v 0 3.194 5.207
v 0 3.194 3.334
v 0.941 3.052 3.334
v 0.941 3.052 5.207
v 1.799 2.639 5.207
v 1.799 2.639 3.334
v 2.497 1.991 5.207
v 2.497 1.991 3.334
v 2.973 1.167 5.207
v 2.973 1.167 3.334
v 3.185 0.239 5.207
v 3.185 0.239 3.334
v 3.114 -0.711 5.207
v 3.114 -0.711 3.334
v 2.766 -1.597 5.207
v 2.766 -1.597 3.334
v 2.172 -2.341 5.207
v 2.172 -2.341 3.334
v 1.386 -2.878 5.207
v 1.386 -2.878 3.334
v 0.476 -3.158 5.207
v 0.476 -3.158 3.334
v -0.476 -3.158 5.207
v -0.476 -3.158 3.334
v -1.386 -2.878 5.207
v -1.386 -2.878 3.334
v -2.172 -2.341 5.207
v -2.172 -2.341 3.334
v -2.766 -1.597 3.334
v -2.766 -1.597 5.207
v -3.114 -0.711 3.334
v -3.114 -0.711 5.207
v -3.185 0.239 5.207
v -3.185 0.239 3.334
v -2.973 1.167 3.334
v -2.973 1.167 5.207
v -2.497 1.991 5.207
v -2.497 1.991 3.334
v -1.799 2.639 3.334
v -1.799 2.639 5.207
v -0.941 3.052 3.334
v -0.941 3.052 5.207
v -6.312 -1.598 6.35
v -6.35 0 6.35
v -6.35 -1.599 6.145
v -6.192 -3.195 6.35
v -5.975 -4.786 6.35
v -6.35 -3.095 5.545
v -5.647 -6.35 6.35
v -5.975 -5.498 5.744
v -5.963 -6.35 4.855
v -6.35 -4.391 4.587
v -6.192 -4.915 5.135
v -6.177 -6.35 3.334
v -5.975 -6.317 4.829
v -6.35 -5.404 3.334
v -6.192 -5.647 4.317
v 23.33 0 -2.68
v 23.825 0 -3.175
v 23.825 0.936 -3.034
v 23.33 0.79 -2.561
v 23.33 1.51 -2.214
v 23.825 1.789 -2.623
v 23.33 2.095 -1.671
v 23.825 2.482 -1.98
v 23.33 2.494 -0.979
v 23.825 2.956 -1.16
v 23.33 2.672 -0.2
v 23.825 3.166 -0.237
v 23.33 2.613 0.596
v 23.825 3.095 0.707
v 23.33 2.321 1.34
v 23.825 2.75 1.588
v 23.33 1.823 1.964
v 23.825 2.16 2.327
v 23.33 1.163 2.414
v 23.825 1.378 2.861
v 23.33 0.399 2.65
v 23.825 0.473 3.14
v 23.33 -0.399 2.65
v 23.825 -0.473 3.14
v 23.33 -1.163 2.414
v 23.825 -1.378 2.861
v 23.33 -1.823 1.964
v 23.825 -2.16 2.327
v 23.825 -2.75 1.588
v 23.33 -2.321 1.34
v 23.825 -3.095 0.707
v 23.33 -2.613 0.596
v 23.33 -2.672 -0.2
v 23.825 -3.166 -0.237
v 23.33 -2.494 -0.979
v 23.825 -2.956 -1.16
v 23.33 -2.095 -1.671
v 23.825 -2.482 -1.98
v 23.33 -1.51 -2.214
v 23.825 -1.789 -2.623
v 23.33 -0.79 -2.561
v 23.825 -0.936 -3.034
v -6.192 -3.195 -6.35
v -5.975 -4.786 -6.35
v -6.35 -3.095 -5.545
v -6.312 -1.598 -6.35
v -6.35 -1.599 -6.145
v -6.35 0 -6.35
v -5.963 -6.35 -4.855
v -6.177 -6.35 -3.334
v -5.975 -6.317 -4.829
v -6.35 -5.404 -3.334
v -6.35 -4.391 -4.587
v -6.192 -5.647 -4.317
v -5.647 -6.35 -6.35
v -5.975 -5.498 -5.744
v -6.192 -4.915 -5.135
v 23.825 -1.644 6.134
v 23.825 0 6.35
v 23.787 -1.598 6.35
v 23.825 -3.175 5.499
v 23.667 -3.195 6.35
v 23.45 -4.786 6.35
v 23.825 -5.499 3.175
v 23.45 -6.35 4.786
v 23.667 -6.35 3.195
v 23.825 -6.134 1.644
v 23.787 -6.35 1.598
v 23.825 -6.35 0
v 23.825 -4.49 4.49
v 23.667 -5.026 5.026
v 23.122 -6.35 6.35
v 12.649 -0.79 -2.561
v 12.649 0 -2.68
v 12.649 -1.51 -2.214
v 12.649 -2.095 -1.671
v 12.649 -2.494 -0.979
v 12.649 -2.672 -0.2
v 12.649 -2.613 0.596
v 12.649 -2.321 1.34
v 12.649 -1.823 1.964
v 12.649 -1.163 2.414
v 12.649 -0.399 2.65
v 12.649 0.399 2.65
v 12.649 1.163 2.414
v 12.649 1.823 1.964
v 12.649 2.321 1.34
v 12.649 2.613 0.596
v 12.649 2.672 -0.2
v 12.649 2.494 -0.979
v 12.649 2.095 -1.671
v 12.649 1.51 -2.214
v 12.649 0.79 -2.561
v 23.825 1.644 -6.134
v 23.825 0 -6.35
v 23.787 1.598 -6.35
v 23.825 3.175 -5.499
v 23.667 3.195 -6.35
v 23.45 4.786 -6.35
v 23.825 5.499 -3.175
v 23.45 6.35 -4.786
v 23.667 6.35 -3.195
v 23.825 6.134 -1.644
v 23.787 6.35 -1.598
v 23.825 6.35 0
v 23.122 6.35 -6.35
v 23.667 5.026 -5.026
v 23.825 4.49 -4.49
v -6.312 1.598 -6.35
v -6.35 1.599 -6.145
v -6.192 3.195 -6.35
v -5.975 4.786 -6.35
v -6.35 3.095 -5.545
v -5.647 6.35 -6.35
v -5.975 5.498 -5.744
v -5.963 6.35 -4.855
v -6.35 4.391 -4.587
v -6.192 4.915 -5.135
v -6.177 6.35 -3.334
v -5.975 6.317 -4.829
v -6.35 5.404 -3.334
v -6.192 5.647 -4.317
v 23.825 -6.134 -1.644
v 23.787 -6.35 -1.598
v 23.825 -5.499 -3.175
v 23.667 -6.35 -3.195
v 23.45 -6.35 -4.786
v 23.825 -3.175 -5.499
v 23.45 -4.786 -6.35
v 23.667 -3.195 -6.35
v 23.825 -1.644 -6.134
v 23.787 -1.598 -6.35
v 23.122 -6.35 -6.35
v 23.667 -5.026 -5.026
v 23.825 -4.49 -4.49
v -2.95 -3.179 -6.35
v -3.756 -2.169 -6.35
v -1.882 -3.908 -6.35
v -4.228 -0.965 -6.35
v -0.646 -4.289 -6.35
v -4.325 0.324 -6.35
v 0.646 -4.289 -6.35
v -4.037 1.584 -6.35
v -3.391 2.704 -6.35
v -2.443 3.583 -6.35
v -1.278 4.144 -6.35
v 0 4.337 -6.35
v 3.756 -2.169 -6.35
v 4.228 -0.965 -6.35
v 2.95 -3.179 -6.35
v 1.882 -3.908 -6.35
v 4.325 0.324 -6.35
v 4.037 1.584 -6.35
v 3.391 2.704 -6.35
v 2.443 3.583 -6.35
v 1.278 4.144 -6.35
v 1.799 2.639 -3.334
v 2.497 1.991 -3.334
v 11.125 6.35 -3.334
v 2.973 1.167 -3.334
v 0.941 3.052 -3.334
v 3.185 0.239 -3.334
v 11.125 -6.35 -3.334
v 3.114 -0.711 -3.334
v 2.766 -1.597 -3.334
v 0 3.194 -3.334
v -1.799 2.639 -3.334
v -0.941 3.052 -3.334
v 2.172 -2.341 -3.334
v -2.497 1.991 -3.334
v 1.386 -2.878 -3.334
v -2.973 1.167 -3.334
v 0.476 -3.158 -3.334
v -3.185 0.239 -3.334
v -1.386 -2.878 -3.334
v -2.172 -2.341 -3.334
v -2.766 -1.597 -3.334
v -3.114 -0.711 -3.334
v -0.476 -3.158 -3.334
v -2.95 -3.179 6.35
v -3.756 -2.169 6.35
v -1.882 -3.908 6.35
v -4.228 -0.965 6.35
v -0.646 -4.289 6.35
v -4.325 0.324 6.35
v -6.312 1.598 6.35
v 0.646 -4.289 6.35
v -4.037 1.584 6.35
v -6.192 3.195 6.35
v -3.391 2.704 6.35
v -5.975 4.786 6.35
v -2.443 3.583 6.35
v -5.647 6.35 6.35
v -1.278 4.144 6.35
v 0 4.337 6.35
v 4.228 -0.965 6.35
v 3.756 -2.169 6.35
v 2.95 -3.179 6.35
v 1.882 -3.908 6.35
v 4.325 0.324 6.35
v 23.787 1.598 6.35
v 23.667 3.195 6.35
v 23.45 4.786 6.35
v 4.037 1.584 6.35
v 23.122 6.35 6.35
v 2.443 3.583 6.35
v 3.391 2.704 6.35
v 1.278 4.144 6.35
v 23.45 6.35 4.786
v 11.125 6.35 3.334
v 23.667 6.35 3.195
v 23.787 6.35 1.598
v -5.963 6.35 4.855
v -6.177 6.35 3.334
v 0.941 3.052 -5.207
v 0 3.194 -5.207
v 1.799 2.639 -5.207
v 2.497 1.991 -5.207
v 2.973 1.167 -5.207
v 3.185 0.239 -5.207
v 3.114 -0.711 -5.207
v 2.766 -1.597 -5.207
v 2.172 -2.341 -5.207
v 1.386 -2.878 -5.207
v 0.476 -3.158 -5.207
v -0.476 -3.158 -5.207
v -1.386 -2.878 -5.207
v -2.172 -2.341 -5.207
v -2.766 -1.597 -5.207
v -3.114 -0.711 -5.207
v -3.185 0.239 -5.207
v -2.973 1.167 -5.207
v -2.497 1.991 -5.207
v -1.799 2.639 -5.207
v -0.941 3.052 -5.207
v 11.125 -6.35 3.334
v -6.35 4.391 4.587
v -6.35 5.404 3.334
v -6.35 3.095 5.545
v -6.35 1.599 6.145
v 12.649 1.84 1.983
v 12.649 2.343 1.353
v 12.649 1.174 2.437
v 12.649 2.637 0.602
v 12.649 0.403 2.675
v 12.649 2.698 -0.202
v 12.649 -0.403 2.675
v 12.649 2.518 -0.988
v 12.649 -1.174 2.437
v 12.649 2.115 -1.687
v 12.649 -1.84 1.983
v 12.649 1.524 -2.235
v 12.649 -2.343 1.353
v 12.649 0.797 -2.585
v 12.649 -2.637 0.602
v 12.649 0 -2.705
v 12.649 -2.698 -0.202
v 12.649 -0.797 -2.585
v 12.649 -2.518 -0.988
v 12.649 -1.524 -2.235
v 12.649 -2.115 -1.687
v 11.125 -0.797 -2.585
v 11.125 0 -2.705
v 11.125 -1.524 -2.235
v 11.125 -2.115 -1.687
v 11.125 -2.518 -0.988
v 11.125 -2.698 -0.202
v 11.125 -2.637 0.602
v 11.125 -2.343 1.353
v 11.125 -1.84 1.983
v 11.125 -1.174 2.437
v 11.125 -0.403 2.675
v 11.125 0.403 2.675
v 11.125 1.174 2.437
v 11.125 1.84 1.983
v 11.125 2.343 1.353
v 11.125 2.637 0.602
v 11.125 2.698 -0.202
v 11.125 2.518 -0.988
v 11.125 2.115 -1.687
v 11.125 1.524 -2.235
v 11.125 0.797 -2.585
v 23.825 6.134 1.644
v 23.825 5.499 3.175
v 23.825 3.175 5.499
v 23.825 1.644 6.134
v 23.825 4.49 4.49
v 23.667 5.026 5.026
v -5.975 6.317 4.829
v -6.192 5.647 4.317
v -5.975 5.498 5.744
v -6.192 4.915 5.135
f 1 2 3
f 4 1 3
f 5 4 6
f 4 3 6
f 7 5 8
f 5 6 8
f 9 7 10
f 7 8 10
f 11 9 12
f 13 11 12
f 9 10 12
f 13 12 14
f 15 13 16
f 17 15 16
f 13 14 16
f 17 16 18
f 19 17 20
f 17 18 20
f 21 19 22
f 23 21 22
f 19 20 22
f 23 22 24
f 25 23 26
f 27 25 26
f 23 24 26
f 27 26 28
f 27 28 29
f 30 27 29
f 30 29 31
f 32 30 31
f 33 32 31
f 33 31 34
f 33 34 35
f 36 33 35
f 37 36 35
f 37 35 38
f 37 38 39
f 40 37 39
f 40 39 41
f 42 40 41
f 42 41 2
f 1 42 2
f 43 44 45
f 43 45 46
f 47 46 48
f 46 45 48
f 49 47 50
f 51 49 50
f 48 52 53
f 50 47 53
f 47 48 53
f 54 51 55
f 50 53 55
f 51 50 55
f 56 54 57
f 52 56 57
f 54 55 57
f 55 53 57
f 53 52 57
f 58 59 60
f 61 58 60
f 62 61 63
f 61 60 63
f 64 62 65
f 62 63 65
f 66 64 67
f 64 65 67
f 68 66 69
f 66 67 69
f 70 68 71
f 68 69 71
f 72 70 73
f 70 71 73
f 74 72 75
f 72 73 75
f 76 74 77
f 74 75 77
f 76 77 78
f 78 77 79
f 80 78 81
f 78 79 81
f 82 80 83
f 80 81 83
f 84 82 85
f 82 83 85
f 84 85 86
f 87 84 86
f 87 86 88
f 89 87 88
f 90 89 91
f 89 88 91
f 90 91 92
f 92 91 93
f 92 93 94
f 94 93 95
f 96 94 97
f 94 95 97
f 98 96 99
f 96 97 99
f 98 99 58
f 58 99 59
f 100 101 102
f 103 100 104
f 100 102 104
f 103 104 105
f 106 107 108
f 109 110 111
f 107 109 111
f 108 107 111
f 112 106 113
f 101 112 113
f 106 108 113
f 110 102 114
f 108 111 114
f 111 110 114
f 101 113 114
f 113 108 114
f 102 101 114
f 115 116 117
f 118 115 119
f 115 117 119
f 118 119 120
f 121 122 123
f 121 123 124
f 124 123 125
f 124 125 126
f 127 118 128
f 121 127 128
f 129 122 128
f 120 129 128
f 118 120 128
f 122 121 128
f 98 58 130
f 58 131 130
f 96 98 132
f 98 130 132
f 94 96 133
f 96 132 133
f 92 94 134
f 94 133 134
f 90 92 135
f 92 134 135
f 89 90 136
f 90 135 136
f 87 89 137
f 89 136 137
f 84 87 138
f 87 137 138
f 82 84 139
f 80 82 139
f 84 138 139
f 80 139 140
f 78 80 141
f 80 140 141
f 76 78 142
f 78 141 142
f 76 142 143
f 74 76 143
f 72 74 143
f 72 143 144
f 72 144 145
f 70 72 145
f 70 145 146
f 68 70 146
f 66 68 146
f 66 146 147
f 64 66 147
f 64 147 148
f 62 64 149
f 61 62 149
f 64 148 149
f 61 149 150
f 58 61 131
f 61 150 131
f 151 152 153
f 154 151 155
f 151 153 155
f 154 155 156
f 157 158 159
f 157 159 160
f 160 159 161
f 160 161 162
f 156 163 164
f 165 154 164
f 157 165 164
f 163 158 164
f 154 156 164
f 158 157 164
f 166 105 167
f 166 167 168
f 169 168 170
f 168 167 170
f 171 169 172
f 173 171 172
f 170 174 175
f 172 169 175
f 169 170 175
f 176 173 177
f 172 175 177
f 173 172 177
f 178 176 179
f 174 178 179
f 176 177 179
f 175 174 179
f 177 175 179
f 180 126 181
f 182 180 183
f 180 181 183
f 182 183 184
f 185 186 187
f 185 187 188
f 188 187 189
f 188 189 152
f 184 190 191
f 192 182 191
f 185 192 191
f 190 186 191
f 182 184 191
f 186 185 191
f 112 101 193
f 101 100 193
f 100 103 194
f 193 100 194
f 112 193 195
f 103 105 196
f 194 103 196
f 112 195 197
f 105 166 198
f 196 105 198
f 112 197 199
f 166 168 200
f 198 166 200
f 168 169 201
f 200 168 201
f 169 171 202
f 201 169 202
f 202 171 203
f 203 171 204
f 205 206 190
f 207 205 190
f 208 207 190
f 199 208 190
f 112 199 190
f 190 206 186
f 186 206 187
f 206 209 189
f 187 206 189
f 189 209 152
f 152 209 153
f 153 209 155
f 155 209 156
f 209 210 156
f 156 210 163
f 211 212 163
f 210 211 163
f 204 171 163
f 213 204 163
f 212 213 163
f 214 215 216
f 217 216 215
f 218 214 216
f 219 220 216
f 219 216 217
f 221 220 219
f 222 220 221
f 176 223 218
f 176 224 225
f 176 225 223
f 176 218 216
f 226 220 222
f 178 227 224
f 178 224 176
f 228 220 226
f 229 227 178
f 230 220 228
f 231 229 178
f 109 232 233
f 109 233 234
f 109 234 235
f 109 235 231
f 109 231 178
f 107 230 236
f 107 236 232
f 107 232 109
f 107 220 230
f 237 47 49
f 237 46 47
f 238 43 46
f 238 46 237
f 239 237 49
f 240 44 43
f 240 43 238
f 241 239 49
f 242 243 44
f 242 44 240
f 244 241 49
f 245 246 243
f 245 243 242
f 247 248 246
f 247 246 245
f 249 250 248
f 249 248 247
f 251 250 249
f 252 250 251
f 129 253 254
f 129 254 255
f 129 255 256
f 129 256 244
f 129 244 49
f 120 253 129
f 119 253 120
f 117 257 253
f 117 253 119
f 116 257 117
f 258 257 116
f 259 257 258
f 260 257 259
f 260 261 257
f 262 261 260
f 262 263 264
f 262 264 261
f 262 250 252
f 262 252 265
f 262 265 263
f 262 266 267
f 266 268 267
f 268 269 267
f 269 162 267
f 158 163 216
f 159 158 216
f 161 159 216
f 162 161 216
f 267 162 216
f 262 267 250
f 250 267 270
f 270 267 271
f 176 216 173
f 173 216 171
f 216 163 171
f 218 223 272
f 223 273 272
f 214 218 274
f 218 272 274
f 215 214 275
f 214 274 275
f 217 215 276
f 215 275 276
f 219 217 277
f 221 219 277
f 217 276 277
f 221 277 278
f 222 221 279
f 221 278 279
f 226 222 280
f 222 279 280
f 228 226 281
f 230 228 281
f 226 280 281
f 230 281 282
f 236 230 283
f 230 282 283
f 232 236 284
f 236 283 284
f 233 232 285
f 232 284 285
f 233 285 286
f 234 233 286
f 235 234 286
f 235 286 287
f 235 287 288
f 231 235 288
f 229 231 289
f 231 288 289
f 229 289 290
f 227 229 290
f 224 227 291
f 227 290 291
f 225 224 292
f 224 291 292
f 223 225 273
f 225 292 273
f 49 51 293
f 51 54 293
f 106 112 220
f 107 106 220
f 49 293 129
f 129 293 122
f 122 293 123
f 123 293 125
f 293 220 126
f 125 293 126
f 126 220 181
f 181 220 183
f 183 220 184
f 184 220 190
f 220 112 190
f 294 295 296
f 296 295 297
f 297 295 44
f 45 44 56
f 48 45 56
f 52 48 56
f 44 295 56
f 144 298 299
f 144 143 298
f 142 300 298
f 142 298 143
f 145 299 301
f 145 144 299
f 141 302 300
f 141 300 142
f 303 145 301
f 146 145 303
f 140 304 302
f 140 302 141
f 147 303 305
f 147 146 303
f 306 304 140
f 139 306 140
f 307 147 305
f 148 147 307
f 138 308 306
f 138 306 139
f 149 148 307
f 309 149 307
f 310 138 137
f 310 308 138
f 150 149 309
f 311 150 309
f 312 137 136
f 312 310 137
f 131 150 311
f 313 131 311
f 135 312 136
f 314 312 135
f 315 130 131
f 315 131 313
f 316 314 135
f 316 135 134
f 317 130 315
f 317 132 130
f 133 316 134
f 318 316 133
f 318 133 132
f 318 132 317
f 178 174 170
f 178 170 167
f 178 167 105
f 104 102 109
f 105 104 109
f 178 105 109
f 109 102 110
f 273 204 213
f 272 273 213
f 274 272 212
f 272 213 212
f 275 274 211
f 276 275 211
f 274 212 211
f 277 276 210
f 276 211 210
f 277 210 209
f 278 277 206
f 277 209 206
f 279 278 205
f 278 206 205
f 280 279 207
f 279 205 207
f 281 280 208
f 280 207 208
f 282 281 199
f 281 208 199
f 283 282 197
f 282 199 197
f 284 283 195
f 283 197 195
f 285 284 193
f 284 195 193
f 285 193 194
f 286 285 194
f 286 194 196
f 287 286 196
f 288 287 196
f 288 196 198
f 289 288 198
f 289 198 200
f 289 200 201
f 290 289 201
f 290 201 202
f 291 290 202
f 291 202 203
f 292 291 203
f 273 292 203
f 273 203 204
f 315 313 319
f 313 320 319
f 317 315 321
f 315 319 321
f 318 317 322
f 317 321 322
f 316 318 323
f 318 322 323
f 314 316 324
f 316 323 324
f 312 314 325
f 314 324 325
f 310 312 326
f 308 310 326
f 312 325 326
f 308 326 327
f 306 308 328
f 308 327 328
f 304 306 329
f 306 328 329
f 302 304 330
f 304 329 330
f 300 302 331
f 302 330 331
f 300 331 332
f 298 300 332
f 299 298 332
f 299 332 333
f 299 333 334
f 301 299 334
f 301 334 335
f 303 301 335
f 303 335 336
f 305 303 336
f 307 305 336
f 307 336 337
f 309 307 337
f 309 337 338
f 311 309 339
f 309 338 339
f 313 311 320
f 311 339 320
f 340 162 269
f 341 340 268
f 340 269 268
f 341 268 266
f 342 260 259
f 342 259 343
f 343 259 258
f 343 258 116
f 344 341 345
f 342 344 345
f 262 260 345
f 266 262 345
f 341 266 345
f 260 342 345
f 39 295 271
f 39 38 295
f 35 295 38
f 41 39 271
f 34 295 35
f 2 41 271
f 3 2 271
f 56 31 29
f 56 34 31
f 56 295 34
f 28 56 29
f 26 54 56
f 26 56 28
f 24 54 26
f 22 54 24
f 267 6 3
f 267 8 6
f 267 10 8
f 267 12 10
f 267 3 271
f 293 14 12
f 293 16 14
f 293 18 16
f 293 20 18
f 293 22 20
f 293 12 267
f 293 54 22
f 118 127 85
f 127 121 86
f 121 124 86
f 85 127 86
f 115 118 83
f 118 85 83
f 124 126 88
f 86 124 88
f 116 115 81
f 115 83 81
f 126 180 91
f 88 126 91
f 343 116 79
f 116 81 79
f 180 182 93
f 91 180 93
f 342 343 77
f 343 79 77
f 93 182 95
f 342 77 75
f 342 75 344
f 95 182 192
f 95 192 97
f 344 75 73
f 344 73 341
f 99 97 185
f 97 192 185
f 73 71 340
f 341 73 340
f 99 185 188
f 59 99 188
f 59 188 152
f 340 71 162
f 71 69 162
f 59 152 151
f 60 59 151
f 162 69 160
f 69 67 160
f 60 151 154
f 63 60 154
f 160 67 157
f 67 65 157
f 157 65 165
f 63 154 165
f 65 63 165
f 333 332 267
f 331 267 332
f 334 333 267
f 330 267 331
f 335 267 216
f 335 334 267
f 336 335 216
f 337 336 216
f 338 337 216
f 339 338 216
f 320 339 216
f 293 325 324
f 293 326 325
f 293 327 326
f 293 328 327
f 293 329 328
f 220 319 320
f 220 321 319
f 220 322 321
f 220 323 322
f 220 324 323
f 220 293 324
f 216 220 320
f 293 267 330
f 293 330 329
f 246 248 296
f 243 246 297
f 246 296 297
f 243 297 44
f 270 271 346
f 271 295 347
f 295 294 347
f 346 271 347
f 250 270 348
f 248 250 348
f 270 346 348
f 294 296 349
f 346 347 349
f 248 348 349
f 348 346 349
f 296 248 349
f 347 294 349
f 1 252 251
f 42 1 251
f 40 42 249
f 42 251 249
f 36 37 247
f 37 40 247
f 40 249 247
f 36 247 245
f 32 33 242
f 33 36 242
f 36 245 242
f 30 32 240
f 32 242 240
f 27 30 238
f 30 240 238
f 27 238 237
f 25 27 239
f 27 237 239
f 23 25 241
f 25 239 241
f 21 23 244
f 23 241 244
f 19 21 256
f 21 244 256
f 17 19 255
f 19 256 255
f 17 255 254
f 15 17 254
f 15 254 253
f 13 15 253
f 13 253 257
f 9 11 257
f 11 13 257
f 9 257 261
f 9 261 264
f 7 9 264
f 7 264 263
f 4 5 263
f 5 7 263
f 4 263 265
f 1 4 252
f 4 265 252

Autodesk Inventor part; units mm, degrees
sketch "Sketch_1" plane through (0, 0, 0) normal (0, 0, 1) x (1, 0, 0)
  line L0 (-6.35, 6.35) -> (-6.35, -6.35)
  line L1 (-6.35, -6.35) -> (23.8252, -6.35)
  line L2 (23.8252, -6.35) -> (23.8252, 6.35)
  line L3 (23.8252, 6.35) -> (-6.35, 6.35)
extrude "Extrusion1" add sketch "Sketch_1" along normal mid plane 12.7
sketch "Sketch_2" plane through (0, 0, 0) normal (0, 1, 0) x (-1, 0, 0)
  line L0 (6.35, -3.3338) -> (6.35, 3.3338)
  line L1 (6.35, 3.3338) -> (-11.1252, 3.3338)
  line L2 (-11.1252, 3.3338) -> (-11.1252, -3.3338)
  line L3 (-11.1252, -3.3338) -> (6.35, -3.3338)
extrude "Extrusion2" cut sketch "Sketch_2" along normal mid plane 12.7
sketch "Sketch3" plane through (23.8252, -6.35, 6.35) normal (1, 0, 0) x (0, 0, -1)
  point P0 (6.35, 6.35)
hole "Drilling 1" at (23.8252, 0, 0) direction (-1, 0, 0) diameter 5.3594 depth 11.176 countersink diameter 6.35 countersink angle 90 thread size "1/4-28 UNF" class "2B" standard "ANSI Unified Screw Threads"
sketch "Sketch4" plane through (12.6492, 0, 0) normal (1, 0, 0) x (0, 0, -1)
  point P0 (0, 0)
hole "Drilling 2" at (12.6492, 0, 0) direction (-1, 0, 0) diameter 5.4102 depth 1.524
sketch "Sketch_5" plane through (0, 0, 0) normal (1, 0, 0) x (0, 1, 0)
  line L0 (0, -6.35) -> (0, 6.35)
  line L1 (0, 6.35) -> (4.337, 6.35)
  line L2 (4.337, 6.35) -> (3.194, 5.207)
  line L3 (3.194, 5.207) -> (3.194, -5.207)
  line L4 (3.194, -5.207) -> (4.337, -6.35)
  line L5 (4.337, -6.35) -> (0, -6.35)
  line L6 (0, -6.35) -> (0, 6.35)
revolve "Revolution1" cut sketch "Sketch_5" angle 360 about axis through (0, 0, -6.35) along (0, 0, -1)
sketch "Sketch_9" plane through (0, 0, 0) normal (0, 0, 1) x (1, 0, 0)
  line L0 (30.1752, 0) -> (23.8252, 0)
  line L1 (23.8252, 0) -> (23.8252, 6.35)
  arc A0 (23.8252, 6.35) -> (21.2852, 12.7) centre (6.6802, 3.175) ccw
  line L2 (21.2852, 12.7) -> (30.1752, 12.7)
  line L3 (30.1752, 12.7) -> (30.1752, 0)
  line L4 (30.1752, 0) -> (23.8252, 0)
revolve "Revolution2" cut sketch "Sketch_9" angle 360 about axis through (30.1752, 0, 0) along (1, 0, 0)
sketch "Sketch_10" plane through (0, 0, 0) normal (0, 0, 1) x (1, 0, 0)
  line L0 (-6.35, 0) -> (-12.7, 0)
  line L1 (-12.7, 0) -> (-12.7, 12.7)
  line L2 (-12.7, 12.7) -> (-3.81, 12.7)
  arc A0 (-3.81, 12.7) -> (-6.35, 6.35) centre (10.795, 3.175) ccw
  line L3 (-6.35, 6.35) -> (-6.35, 0)
  line L4 (-6.35, 0) -> (-12.7, 0)
revolve "Revolution3" cut sketch "Sketch_10" angle 360 about axis through (-6.35, 0, 0) along (1, 0, 0)
ref_plane "th1_XY" through (23.8252, 3.175, 0) normal (0, 0, 1) x (1, 0, 0)
ref_plane "th1_YZ" through (23.8252, 3.175, 0) normal (1, 0, 0) x (0, 1, 0)
ref_plane "th1_ZX" through (23.8252, 3.175, 0) normal (0, 1, 0) x (0, 0, 1)
ref_plane "th2_XY" through (23.8252, -3.175, 0) normal (0, 0, 1) x (1, 0, 0)
ref_plane "th2_YZ" through (23.8252, -3.175, 0) normal (1, 0, 0) x (0, 1, 0)
ref_plane "th2_ZX" through (23.8252, -3.175, 0) normal (0, 1, 0) x (0, 0, 1)
ref_plane "rod_clevis_body_XY" through (0, 0, 0) normal (0, 0, 1) x (1, 0, 0)
ref_plane "rod_clevis_body_YZ" through (0, 0, 0) normal (1, 0, 0) x (0, 1, 0)
ref_plane "rod_clevis_body_ZX" through (0, 0, 0) normal (0, 1, 0) x (0, 0, 1)
ref_plane "piston_rod_clevis_XY" through (23.8252, 0, 0) normal (1, 0, 0) x (0, 0, -1)
ref_plane "piston_rod_clevis_YZ" through (23.8252, 0, 0) normal (0, 0, -1) x (0, 1, 0)
ref_plane "piston_rod_clevis_ZX" through (23.8252, 0, 0) normal (0, 1, 0) x (1, 0, 0)
ref_plane "dummy_XY" through (0, 0, 0) normal (0, 0, 1) x (1, 0, 0)
ref_plane "dummy_YZ" through (0, 0, 0) normal (1, 0, 0) x (0, 1, 0)
ref_plane "dummy_ZX" through (0, 0, 0) normal (0, 1, 0) x (0, 0, 1)
ref_plane "l11_XY" through (23.8252, 6.35, 0) normal (0, 0, 1) x (1, 0, 0)
ref_plane "l11_YZ" through (23.8252, 6.35, 0) normal (1, 0, 0) x (0, 1, 0)
ref_plane "l11_ZX" through (23.8252, 6.35, 0) normal (0, 1, 0) x (0, 0, 1)
ref_plane "l12_XY" through (0, 6.35, 0) normal (0, 0, 1) x (1, 0, 0)
ref_plane "l12_YZ" through (0, 6.35, 0) normal (1, 0, 0) x (0, 1, 0)
ref_plane "l12_ZX" through (0, 6.35, 0) normal (0, 1, 0) x (0, 0, 1)
ref_plane "l1_XY" through (23.8252, 6.35, 0) normal (0, 0, 1) x (1, 0, 0)
ref_plane "l1_YZ" through (23.8252, 6.35, 0) normal (1, 0, 0) x (0, 1, 0)
ref_plane "l1_ZX" through (23.8252, 6.35, 0) normal (0, 1, 0) x (0, 0, 1)
ref_plane "h1_XY" through (-6.35, 6.35, 0) normal (0, 0, 1) x (1, 0, 0)
ref_plane "h1_YZ" through (-6.35, 6.35, 0) normal (1, 0, 0) x (0, 1, 0)
ref_plane "h1_ZX" through (-6.35, 6.35, 0) normal (0, 1, 0) x (0, 0, 1)
ref_plane "l2_XY" through (-6.35, 6.35, 0) normal (0, 0, 1) x (1, 0, 0)
ref_plane "l2_YZ" through (-6.35, 6.35, 0) normal (1, 0, 0) x (0, 1, 0)
ref_plane "l2_ZX" through (-6.35, 6.35, 0) normal (0, 1, 0) x (0, 0, 1)
ref_plane "h2_XY" through (-6.35, -6.35, 0) normal (0, 0, 1) x (1, 0, 0)
ref_plane "h2_YZ" through (-6.35, -6.35, 0) normal (1, 0, 0) x (0, 1, 0)
ref_plane "h2_ZX" through (-6.35, -6.35, 0) normal (0, 1, 0) x (0, 0, 1)
ref_plane "w11_XY" through (-6.35, 0, -3.3338) normal (0, 1, 0) x (1, 0, 0)
ref_plane "w11_YZ" through (-6.35, 0, -3.3338) normal (1, 0, 0) x (0, 0, -1)
ref_plane "w11_ZX" through (-6.35, 0, -3.3338) normal (0, 0, -1) x (0, 1, 0)
ref_plane "w12_XY" through (-6.35, 0, 3.3338) normal (0, 1, 0) x (1, 0, 0)
ref_plane "w12_YZ" through (-6.35, 0, 3.3338) normal (1, 0, 0) x (0, 0, -1)
ref_plane "w12_ZX" through (-6.35, 0, 3.3338) normal (0, 0, -1) x (0, 1, 0)
ref_plane "l21_XY" through (23.8252, 0, 0) normal (0, 1, 0) x (1, 0, 0)
ref_plane "l21_YZ" through (23.8252, 0, 0) normal (1, 0, 0) x (0, 0, -1)
ref_plane "l21_ZX" through (23.8252, 0, 0) normal (0, 0, -1) x (0, 1, 0)
ref_plane "l22_XY" through (11.1252, 0, 0) normal (0, 1, 0) x (1, 0, 0)
ref_plane "l22_YZ" through (11.1252, 0, 0) normal (1, 0, 0) x (0, 0, -1)
ref_plane "l22_ZX" through (11.1252, 0, 0) normal (0, 0, -1) x (0, 1, 0)
ref_plane "w1_XY" through (23.8252, 0, -6.35) normal (0, 1, 0) x (1, 0, 0)
ref_plane "w1_YZ" through (23.8252, 0, -6.35) normal (1, 0, 0) x (0, 0, -1)
ref_plane "w1_ZX" through (23.8252, 0, -6.35) normal (0, 0, -1) x (0, 1, 0)
ref_plane "w2_XY" through (23.8252, 0, 6.35) normal (0, 1, 0) x (1, 0, 0)
ref_plane "w2_YZ" through (23.8252, 0, 6.35) normal (1, 0, 0) x (0, 0, -1)
ref_plane "w2_ZX" through (23.8252, 0, 6.35) normal (0, 0, -1) x (0, 1, 0)
ref_plane "to_cylinder_XY" through (11.1252, 0, 0) normal (1, 0, 0) x (0, 0, -1)
ref_plane "to_cylinder_YZ" through (11.1252, 0, 0) normal (0, 0, -1) x (0, 1, 0)
ref_plane "to_cylinder_ZX" through (11.1252, 0, 0) normal (0, 1, 0) x (1, 0, 0)
properties part number "D-14055"
